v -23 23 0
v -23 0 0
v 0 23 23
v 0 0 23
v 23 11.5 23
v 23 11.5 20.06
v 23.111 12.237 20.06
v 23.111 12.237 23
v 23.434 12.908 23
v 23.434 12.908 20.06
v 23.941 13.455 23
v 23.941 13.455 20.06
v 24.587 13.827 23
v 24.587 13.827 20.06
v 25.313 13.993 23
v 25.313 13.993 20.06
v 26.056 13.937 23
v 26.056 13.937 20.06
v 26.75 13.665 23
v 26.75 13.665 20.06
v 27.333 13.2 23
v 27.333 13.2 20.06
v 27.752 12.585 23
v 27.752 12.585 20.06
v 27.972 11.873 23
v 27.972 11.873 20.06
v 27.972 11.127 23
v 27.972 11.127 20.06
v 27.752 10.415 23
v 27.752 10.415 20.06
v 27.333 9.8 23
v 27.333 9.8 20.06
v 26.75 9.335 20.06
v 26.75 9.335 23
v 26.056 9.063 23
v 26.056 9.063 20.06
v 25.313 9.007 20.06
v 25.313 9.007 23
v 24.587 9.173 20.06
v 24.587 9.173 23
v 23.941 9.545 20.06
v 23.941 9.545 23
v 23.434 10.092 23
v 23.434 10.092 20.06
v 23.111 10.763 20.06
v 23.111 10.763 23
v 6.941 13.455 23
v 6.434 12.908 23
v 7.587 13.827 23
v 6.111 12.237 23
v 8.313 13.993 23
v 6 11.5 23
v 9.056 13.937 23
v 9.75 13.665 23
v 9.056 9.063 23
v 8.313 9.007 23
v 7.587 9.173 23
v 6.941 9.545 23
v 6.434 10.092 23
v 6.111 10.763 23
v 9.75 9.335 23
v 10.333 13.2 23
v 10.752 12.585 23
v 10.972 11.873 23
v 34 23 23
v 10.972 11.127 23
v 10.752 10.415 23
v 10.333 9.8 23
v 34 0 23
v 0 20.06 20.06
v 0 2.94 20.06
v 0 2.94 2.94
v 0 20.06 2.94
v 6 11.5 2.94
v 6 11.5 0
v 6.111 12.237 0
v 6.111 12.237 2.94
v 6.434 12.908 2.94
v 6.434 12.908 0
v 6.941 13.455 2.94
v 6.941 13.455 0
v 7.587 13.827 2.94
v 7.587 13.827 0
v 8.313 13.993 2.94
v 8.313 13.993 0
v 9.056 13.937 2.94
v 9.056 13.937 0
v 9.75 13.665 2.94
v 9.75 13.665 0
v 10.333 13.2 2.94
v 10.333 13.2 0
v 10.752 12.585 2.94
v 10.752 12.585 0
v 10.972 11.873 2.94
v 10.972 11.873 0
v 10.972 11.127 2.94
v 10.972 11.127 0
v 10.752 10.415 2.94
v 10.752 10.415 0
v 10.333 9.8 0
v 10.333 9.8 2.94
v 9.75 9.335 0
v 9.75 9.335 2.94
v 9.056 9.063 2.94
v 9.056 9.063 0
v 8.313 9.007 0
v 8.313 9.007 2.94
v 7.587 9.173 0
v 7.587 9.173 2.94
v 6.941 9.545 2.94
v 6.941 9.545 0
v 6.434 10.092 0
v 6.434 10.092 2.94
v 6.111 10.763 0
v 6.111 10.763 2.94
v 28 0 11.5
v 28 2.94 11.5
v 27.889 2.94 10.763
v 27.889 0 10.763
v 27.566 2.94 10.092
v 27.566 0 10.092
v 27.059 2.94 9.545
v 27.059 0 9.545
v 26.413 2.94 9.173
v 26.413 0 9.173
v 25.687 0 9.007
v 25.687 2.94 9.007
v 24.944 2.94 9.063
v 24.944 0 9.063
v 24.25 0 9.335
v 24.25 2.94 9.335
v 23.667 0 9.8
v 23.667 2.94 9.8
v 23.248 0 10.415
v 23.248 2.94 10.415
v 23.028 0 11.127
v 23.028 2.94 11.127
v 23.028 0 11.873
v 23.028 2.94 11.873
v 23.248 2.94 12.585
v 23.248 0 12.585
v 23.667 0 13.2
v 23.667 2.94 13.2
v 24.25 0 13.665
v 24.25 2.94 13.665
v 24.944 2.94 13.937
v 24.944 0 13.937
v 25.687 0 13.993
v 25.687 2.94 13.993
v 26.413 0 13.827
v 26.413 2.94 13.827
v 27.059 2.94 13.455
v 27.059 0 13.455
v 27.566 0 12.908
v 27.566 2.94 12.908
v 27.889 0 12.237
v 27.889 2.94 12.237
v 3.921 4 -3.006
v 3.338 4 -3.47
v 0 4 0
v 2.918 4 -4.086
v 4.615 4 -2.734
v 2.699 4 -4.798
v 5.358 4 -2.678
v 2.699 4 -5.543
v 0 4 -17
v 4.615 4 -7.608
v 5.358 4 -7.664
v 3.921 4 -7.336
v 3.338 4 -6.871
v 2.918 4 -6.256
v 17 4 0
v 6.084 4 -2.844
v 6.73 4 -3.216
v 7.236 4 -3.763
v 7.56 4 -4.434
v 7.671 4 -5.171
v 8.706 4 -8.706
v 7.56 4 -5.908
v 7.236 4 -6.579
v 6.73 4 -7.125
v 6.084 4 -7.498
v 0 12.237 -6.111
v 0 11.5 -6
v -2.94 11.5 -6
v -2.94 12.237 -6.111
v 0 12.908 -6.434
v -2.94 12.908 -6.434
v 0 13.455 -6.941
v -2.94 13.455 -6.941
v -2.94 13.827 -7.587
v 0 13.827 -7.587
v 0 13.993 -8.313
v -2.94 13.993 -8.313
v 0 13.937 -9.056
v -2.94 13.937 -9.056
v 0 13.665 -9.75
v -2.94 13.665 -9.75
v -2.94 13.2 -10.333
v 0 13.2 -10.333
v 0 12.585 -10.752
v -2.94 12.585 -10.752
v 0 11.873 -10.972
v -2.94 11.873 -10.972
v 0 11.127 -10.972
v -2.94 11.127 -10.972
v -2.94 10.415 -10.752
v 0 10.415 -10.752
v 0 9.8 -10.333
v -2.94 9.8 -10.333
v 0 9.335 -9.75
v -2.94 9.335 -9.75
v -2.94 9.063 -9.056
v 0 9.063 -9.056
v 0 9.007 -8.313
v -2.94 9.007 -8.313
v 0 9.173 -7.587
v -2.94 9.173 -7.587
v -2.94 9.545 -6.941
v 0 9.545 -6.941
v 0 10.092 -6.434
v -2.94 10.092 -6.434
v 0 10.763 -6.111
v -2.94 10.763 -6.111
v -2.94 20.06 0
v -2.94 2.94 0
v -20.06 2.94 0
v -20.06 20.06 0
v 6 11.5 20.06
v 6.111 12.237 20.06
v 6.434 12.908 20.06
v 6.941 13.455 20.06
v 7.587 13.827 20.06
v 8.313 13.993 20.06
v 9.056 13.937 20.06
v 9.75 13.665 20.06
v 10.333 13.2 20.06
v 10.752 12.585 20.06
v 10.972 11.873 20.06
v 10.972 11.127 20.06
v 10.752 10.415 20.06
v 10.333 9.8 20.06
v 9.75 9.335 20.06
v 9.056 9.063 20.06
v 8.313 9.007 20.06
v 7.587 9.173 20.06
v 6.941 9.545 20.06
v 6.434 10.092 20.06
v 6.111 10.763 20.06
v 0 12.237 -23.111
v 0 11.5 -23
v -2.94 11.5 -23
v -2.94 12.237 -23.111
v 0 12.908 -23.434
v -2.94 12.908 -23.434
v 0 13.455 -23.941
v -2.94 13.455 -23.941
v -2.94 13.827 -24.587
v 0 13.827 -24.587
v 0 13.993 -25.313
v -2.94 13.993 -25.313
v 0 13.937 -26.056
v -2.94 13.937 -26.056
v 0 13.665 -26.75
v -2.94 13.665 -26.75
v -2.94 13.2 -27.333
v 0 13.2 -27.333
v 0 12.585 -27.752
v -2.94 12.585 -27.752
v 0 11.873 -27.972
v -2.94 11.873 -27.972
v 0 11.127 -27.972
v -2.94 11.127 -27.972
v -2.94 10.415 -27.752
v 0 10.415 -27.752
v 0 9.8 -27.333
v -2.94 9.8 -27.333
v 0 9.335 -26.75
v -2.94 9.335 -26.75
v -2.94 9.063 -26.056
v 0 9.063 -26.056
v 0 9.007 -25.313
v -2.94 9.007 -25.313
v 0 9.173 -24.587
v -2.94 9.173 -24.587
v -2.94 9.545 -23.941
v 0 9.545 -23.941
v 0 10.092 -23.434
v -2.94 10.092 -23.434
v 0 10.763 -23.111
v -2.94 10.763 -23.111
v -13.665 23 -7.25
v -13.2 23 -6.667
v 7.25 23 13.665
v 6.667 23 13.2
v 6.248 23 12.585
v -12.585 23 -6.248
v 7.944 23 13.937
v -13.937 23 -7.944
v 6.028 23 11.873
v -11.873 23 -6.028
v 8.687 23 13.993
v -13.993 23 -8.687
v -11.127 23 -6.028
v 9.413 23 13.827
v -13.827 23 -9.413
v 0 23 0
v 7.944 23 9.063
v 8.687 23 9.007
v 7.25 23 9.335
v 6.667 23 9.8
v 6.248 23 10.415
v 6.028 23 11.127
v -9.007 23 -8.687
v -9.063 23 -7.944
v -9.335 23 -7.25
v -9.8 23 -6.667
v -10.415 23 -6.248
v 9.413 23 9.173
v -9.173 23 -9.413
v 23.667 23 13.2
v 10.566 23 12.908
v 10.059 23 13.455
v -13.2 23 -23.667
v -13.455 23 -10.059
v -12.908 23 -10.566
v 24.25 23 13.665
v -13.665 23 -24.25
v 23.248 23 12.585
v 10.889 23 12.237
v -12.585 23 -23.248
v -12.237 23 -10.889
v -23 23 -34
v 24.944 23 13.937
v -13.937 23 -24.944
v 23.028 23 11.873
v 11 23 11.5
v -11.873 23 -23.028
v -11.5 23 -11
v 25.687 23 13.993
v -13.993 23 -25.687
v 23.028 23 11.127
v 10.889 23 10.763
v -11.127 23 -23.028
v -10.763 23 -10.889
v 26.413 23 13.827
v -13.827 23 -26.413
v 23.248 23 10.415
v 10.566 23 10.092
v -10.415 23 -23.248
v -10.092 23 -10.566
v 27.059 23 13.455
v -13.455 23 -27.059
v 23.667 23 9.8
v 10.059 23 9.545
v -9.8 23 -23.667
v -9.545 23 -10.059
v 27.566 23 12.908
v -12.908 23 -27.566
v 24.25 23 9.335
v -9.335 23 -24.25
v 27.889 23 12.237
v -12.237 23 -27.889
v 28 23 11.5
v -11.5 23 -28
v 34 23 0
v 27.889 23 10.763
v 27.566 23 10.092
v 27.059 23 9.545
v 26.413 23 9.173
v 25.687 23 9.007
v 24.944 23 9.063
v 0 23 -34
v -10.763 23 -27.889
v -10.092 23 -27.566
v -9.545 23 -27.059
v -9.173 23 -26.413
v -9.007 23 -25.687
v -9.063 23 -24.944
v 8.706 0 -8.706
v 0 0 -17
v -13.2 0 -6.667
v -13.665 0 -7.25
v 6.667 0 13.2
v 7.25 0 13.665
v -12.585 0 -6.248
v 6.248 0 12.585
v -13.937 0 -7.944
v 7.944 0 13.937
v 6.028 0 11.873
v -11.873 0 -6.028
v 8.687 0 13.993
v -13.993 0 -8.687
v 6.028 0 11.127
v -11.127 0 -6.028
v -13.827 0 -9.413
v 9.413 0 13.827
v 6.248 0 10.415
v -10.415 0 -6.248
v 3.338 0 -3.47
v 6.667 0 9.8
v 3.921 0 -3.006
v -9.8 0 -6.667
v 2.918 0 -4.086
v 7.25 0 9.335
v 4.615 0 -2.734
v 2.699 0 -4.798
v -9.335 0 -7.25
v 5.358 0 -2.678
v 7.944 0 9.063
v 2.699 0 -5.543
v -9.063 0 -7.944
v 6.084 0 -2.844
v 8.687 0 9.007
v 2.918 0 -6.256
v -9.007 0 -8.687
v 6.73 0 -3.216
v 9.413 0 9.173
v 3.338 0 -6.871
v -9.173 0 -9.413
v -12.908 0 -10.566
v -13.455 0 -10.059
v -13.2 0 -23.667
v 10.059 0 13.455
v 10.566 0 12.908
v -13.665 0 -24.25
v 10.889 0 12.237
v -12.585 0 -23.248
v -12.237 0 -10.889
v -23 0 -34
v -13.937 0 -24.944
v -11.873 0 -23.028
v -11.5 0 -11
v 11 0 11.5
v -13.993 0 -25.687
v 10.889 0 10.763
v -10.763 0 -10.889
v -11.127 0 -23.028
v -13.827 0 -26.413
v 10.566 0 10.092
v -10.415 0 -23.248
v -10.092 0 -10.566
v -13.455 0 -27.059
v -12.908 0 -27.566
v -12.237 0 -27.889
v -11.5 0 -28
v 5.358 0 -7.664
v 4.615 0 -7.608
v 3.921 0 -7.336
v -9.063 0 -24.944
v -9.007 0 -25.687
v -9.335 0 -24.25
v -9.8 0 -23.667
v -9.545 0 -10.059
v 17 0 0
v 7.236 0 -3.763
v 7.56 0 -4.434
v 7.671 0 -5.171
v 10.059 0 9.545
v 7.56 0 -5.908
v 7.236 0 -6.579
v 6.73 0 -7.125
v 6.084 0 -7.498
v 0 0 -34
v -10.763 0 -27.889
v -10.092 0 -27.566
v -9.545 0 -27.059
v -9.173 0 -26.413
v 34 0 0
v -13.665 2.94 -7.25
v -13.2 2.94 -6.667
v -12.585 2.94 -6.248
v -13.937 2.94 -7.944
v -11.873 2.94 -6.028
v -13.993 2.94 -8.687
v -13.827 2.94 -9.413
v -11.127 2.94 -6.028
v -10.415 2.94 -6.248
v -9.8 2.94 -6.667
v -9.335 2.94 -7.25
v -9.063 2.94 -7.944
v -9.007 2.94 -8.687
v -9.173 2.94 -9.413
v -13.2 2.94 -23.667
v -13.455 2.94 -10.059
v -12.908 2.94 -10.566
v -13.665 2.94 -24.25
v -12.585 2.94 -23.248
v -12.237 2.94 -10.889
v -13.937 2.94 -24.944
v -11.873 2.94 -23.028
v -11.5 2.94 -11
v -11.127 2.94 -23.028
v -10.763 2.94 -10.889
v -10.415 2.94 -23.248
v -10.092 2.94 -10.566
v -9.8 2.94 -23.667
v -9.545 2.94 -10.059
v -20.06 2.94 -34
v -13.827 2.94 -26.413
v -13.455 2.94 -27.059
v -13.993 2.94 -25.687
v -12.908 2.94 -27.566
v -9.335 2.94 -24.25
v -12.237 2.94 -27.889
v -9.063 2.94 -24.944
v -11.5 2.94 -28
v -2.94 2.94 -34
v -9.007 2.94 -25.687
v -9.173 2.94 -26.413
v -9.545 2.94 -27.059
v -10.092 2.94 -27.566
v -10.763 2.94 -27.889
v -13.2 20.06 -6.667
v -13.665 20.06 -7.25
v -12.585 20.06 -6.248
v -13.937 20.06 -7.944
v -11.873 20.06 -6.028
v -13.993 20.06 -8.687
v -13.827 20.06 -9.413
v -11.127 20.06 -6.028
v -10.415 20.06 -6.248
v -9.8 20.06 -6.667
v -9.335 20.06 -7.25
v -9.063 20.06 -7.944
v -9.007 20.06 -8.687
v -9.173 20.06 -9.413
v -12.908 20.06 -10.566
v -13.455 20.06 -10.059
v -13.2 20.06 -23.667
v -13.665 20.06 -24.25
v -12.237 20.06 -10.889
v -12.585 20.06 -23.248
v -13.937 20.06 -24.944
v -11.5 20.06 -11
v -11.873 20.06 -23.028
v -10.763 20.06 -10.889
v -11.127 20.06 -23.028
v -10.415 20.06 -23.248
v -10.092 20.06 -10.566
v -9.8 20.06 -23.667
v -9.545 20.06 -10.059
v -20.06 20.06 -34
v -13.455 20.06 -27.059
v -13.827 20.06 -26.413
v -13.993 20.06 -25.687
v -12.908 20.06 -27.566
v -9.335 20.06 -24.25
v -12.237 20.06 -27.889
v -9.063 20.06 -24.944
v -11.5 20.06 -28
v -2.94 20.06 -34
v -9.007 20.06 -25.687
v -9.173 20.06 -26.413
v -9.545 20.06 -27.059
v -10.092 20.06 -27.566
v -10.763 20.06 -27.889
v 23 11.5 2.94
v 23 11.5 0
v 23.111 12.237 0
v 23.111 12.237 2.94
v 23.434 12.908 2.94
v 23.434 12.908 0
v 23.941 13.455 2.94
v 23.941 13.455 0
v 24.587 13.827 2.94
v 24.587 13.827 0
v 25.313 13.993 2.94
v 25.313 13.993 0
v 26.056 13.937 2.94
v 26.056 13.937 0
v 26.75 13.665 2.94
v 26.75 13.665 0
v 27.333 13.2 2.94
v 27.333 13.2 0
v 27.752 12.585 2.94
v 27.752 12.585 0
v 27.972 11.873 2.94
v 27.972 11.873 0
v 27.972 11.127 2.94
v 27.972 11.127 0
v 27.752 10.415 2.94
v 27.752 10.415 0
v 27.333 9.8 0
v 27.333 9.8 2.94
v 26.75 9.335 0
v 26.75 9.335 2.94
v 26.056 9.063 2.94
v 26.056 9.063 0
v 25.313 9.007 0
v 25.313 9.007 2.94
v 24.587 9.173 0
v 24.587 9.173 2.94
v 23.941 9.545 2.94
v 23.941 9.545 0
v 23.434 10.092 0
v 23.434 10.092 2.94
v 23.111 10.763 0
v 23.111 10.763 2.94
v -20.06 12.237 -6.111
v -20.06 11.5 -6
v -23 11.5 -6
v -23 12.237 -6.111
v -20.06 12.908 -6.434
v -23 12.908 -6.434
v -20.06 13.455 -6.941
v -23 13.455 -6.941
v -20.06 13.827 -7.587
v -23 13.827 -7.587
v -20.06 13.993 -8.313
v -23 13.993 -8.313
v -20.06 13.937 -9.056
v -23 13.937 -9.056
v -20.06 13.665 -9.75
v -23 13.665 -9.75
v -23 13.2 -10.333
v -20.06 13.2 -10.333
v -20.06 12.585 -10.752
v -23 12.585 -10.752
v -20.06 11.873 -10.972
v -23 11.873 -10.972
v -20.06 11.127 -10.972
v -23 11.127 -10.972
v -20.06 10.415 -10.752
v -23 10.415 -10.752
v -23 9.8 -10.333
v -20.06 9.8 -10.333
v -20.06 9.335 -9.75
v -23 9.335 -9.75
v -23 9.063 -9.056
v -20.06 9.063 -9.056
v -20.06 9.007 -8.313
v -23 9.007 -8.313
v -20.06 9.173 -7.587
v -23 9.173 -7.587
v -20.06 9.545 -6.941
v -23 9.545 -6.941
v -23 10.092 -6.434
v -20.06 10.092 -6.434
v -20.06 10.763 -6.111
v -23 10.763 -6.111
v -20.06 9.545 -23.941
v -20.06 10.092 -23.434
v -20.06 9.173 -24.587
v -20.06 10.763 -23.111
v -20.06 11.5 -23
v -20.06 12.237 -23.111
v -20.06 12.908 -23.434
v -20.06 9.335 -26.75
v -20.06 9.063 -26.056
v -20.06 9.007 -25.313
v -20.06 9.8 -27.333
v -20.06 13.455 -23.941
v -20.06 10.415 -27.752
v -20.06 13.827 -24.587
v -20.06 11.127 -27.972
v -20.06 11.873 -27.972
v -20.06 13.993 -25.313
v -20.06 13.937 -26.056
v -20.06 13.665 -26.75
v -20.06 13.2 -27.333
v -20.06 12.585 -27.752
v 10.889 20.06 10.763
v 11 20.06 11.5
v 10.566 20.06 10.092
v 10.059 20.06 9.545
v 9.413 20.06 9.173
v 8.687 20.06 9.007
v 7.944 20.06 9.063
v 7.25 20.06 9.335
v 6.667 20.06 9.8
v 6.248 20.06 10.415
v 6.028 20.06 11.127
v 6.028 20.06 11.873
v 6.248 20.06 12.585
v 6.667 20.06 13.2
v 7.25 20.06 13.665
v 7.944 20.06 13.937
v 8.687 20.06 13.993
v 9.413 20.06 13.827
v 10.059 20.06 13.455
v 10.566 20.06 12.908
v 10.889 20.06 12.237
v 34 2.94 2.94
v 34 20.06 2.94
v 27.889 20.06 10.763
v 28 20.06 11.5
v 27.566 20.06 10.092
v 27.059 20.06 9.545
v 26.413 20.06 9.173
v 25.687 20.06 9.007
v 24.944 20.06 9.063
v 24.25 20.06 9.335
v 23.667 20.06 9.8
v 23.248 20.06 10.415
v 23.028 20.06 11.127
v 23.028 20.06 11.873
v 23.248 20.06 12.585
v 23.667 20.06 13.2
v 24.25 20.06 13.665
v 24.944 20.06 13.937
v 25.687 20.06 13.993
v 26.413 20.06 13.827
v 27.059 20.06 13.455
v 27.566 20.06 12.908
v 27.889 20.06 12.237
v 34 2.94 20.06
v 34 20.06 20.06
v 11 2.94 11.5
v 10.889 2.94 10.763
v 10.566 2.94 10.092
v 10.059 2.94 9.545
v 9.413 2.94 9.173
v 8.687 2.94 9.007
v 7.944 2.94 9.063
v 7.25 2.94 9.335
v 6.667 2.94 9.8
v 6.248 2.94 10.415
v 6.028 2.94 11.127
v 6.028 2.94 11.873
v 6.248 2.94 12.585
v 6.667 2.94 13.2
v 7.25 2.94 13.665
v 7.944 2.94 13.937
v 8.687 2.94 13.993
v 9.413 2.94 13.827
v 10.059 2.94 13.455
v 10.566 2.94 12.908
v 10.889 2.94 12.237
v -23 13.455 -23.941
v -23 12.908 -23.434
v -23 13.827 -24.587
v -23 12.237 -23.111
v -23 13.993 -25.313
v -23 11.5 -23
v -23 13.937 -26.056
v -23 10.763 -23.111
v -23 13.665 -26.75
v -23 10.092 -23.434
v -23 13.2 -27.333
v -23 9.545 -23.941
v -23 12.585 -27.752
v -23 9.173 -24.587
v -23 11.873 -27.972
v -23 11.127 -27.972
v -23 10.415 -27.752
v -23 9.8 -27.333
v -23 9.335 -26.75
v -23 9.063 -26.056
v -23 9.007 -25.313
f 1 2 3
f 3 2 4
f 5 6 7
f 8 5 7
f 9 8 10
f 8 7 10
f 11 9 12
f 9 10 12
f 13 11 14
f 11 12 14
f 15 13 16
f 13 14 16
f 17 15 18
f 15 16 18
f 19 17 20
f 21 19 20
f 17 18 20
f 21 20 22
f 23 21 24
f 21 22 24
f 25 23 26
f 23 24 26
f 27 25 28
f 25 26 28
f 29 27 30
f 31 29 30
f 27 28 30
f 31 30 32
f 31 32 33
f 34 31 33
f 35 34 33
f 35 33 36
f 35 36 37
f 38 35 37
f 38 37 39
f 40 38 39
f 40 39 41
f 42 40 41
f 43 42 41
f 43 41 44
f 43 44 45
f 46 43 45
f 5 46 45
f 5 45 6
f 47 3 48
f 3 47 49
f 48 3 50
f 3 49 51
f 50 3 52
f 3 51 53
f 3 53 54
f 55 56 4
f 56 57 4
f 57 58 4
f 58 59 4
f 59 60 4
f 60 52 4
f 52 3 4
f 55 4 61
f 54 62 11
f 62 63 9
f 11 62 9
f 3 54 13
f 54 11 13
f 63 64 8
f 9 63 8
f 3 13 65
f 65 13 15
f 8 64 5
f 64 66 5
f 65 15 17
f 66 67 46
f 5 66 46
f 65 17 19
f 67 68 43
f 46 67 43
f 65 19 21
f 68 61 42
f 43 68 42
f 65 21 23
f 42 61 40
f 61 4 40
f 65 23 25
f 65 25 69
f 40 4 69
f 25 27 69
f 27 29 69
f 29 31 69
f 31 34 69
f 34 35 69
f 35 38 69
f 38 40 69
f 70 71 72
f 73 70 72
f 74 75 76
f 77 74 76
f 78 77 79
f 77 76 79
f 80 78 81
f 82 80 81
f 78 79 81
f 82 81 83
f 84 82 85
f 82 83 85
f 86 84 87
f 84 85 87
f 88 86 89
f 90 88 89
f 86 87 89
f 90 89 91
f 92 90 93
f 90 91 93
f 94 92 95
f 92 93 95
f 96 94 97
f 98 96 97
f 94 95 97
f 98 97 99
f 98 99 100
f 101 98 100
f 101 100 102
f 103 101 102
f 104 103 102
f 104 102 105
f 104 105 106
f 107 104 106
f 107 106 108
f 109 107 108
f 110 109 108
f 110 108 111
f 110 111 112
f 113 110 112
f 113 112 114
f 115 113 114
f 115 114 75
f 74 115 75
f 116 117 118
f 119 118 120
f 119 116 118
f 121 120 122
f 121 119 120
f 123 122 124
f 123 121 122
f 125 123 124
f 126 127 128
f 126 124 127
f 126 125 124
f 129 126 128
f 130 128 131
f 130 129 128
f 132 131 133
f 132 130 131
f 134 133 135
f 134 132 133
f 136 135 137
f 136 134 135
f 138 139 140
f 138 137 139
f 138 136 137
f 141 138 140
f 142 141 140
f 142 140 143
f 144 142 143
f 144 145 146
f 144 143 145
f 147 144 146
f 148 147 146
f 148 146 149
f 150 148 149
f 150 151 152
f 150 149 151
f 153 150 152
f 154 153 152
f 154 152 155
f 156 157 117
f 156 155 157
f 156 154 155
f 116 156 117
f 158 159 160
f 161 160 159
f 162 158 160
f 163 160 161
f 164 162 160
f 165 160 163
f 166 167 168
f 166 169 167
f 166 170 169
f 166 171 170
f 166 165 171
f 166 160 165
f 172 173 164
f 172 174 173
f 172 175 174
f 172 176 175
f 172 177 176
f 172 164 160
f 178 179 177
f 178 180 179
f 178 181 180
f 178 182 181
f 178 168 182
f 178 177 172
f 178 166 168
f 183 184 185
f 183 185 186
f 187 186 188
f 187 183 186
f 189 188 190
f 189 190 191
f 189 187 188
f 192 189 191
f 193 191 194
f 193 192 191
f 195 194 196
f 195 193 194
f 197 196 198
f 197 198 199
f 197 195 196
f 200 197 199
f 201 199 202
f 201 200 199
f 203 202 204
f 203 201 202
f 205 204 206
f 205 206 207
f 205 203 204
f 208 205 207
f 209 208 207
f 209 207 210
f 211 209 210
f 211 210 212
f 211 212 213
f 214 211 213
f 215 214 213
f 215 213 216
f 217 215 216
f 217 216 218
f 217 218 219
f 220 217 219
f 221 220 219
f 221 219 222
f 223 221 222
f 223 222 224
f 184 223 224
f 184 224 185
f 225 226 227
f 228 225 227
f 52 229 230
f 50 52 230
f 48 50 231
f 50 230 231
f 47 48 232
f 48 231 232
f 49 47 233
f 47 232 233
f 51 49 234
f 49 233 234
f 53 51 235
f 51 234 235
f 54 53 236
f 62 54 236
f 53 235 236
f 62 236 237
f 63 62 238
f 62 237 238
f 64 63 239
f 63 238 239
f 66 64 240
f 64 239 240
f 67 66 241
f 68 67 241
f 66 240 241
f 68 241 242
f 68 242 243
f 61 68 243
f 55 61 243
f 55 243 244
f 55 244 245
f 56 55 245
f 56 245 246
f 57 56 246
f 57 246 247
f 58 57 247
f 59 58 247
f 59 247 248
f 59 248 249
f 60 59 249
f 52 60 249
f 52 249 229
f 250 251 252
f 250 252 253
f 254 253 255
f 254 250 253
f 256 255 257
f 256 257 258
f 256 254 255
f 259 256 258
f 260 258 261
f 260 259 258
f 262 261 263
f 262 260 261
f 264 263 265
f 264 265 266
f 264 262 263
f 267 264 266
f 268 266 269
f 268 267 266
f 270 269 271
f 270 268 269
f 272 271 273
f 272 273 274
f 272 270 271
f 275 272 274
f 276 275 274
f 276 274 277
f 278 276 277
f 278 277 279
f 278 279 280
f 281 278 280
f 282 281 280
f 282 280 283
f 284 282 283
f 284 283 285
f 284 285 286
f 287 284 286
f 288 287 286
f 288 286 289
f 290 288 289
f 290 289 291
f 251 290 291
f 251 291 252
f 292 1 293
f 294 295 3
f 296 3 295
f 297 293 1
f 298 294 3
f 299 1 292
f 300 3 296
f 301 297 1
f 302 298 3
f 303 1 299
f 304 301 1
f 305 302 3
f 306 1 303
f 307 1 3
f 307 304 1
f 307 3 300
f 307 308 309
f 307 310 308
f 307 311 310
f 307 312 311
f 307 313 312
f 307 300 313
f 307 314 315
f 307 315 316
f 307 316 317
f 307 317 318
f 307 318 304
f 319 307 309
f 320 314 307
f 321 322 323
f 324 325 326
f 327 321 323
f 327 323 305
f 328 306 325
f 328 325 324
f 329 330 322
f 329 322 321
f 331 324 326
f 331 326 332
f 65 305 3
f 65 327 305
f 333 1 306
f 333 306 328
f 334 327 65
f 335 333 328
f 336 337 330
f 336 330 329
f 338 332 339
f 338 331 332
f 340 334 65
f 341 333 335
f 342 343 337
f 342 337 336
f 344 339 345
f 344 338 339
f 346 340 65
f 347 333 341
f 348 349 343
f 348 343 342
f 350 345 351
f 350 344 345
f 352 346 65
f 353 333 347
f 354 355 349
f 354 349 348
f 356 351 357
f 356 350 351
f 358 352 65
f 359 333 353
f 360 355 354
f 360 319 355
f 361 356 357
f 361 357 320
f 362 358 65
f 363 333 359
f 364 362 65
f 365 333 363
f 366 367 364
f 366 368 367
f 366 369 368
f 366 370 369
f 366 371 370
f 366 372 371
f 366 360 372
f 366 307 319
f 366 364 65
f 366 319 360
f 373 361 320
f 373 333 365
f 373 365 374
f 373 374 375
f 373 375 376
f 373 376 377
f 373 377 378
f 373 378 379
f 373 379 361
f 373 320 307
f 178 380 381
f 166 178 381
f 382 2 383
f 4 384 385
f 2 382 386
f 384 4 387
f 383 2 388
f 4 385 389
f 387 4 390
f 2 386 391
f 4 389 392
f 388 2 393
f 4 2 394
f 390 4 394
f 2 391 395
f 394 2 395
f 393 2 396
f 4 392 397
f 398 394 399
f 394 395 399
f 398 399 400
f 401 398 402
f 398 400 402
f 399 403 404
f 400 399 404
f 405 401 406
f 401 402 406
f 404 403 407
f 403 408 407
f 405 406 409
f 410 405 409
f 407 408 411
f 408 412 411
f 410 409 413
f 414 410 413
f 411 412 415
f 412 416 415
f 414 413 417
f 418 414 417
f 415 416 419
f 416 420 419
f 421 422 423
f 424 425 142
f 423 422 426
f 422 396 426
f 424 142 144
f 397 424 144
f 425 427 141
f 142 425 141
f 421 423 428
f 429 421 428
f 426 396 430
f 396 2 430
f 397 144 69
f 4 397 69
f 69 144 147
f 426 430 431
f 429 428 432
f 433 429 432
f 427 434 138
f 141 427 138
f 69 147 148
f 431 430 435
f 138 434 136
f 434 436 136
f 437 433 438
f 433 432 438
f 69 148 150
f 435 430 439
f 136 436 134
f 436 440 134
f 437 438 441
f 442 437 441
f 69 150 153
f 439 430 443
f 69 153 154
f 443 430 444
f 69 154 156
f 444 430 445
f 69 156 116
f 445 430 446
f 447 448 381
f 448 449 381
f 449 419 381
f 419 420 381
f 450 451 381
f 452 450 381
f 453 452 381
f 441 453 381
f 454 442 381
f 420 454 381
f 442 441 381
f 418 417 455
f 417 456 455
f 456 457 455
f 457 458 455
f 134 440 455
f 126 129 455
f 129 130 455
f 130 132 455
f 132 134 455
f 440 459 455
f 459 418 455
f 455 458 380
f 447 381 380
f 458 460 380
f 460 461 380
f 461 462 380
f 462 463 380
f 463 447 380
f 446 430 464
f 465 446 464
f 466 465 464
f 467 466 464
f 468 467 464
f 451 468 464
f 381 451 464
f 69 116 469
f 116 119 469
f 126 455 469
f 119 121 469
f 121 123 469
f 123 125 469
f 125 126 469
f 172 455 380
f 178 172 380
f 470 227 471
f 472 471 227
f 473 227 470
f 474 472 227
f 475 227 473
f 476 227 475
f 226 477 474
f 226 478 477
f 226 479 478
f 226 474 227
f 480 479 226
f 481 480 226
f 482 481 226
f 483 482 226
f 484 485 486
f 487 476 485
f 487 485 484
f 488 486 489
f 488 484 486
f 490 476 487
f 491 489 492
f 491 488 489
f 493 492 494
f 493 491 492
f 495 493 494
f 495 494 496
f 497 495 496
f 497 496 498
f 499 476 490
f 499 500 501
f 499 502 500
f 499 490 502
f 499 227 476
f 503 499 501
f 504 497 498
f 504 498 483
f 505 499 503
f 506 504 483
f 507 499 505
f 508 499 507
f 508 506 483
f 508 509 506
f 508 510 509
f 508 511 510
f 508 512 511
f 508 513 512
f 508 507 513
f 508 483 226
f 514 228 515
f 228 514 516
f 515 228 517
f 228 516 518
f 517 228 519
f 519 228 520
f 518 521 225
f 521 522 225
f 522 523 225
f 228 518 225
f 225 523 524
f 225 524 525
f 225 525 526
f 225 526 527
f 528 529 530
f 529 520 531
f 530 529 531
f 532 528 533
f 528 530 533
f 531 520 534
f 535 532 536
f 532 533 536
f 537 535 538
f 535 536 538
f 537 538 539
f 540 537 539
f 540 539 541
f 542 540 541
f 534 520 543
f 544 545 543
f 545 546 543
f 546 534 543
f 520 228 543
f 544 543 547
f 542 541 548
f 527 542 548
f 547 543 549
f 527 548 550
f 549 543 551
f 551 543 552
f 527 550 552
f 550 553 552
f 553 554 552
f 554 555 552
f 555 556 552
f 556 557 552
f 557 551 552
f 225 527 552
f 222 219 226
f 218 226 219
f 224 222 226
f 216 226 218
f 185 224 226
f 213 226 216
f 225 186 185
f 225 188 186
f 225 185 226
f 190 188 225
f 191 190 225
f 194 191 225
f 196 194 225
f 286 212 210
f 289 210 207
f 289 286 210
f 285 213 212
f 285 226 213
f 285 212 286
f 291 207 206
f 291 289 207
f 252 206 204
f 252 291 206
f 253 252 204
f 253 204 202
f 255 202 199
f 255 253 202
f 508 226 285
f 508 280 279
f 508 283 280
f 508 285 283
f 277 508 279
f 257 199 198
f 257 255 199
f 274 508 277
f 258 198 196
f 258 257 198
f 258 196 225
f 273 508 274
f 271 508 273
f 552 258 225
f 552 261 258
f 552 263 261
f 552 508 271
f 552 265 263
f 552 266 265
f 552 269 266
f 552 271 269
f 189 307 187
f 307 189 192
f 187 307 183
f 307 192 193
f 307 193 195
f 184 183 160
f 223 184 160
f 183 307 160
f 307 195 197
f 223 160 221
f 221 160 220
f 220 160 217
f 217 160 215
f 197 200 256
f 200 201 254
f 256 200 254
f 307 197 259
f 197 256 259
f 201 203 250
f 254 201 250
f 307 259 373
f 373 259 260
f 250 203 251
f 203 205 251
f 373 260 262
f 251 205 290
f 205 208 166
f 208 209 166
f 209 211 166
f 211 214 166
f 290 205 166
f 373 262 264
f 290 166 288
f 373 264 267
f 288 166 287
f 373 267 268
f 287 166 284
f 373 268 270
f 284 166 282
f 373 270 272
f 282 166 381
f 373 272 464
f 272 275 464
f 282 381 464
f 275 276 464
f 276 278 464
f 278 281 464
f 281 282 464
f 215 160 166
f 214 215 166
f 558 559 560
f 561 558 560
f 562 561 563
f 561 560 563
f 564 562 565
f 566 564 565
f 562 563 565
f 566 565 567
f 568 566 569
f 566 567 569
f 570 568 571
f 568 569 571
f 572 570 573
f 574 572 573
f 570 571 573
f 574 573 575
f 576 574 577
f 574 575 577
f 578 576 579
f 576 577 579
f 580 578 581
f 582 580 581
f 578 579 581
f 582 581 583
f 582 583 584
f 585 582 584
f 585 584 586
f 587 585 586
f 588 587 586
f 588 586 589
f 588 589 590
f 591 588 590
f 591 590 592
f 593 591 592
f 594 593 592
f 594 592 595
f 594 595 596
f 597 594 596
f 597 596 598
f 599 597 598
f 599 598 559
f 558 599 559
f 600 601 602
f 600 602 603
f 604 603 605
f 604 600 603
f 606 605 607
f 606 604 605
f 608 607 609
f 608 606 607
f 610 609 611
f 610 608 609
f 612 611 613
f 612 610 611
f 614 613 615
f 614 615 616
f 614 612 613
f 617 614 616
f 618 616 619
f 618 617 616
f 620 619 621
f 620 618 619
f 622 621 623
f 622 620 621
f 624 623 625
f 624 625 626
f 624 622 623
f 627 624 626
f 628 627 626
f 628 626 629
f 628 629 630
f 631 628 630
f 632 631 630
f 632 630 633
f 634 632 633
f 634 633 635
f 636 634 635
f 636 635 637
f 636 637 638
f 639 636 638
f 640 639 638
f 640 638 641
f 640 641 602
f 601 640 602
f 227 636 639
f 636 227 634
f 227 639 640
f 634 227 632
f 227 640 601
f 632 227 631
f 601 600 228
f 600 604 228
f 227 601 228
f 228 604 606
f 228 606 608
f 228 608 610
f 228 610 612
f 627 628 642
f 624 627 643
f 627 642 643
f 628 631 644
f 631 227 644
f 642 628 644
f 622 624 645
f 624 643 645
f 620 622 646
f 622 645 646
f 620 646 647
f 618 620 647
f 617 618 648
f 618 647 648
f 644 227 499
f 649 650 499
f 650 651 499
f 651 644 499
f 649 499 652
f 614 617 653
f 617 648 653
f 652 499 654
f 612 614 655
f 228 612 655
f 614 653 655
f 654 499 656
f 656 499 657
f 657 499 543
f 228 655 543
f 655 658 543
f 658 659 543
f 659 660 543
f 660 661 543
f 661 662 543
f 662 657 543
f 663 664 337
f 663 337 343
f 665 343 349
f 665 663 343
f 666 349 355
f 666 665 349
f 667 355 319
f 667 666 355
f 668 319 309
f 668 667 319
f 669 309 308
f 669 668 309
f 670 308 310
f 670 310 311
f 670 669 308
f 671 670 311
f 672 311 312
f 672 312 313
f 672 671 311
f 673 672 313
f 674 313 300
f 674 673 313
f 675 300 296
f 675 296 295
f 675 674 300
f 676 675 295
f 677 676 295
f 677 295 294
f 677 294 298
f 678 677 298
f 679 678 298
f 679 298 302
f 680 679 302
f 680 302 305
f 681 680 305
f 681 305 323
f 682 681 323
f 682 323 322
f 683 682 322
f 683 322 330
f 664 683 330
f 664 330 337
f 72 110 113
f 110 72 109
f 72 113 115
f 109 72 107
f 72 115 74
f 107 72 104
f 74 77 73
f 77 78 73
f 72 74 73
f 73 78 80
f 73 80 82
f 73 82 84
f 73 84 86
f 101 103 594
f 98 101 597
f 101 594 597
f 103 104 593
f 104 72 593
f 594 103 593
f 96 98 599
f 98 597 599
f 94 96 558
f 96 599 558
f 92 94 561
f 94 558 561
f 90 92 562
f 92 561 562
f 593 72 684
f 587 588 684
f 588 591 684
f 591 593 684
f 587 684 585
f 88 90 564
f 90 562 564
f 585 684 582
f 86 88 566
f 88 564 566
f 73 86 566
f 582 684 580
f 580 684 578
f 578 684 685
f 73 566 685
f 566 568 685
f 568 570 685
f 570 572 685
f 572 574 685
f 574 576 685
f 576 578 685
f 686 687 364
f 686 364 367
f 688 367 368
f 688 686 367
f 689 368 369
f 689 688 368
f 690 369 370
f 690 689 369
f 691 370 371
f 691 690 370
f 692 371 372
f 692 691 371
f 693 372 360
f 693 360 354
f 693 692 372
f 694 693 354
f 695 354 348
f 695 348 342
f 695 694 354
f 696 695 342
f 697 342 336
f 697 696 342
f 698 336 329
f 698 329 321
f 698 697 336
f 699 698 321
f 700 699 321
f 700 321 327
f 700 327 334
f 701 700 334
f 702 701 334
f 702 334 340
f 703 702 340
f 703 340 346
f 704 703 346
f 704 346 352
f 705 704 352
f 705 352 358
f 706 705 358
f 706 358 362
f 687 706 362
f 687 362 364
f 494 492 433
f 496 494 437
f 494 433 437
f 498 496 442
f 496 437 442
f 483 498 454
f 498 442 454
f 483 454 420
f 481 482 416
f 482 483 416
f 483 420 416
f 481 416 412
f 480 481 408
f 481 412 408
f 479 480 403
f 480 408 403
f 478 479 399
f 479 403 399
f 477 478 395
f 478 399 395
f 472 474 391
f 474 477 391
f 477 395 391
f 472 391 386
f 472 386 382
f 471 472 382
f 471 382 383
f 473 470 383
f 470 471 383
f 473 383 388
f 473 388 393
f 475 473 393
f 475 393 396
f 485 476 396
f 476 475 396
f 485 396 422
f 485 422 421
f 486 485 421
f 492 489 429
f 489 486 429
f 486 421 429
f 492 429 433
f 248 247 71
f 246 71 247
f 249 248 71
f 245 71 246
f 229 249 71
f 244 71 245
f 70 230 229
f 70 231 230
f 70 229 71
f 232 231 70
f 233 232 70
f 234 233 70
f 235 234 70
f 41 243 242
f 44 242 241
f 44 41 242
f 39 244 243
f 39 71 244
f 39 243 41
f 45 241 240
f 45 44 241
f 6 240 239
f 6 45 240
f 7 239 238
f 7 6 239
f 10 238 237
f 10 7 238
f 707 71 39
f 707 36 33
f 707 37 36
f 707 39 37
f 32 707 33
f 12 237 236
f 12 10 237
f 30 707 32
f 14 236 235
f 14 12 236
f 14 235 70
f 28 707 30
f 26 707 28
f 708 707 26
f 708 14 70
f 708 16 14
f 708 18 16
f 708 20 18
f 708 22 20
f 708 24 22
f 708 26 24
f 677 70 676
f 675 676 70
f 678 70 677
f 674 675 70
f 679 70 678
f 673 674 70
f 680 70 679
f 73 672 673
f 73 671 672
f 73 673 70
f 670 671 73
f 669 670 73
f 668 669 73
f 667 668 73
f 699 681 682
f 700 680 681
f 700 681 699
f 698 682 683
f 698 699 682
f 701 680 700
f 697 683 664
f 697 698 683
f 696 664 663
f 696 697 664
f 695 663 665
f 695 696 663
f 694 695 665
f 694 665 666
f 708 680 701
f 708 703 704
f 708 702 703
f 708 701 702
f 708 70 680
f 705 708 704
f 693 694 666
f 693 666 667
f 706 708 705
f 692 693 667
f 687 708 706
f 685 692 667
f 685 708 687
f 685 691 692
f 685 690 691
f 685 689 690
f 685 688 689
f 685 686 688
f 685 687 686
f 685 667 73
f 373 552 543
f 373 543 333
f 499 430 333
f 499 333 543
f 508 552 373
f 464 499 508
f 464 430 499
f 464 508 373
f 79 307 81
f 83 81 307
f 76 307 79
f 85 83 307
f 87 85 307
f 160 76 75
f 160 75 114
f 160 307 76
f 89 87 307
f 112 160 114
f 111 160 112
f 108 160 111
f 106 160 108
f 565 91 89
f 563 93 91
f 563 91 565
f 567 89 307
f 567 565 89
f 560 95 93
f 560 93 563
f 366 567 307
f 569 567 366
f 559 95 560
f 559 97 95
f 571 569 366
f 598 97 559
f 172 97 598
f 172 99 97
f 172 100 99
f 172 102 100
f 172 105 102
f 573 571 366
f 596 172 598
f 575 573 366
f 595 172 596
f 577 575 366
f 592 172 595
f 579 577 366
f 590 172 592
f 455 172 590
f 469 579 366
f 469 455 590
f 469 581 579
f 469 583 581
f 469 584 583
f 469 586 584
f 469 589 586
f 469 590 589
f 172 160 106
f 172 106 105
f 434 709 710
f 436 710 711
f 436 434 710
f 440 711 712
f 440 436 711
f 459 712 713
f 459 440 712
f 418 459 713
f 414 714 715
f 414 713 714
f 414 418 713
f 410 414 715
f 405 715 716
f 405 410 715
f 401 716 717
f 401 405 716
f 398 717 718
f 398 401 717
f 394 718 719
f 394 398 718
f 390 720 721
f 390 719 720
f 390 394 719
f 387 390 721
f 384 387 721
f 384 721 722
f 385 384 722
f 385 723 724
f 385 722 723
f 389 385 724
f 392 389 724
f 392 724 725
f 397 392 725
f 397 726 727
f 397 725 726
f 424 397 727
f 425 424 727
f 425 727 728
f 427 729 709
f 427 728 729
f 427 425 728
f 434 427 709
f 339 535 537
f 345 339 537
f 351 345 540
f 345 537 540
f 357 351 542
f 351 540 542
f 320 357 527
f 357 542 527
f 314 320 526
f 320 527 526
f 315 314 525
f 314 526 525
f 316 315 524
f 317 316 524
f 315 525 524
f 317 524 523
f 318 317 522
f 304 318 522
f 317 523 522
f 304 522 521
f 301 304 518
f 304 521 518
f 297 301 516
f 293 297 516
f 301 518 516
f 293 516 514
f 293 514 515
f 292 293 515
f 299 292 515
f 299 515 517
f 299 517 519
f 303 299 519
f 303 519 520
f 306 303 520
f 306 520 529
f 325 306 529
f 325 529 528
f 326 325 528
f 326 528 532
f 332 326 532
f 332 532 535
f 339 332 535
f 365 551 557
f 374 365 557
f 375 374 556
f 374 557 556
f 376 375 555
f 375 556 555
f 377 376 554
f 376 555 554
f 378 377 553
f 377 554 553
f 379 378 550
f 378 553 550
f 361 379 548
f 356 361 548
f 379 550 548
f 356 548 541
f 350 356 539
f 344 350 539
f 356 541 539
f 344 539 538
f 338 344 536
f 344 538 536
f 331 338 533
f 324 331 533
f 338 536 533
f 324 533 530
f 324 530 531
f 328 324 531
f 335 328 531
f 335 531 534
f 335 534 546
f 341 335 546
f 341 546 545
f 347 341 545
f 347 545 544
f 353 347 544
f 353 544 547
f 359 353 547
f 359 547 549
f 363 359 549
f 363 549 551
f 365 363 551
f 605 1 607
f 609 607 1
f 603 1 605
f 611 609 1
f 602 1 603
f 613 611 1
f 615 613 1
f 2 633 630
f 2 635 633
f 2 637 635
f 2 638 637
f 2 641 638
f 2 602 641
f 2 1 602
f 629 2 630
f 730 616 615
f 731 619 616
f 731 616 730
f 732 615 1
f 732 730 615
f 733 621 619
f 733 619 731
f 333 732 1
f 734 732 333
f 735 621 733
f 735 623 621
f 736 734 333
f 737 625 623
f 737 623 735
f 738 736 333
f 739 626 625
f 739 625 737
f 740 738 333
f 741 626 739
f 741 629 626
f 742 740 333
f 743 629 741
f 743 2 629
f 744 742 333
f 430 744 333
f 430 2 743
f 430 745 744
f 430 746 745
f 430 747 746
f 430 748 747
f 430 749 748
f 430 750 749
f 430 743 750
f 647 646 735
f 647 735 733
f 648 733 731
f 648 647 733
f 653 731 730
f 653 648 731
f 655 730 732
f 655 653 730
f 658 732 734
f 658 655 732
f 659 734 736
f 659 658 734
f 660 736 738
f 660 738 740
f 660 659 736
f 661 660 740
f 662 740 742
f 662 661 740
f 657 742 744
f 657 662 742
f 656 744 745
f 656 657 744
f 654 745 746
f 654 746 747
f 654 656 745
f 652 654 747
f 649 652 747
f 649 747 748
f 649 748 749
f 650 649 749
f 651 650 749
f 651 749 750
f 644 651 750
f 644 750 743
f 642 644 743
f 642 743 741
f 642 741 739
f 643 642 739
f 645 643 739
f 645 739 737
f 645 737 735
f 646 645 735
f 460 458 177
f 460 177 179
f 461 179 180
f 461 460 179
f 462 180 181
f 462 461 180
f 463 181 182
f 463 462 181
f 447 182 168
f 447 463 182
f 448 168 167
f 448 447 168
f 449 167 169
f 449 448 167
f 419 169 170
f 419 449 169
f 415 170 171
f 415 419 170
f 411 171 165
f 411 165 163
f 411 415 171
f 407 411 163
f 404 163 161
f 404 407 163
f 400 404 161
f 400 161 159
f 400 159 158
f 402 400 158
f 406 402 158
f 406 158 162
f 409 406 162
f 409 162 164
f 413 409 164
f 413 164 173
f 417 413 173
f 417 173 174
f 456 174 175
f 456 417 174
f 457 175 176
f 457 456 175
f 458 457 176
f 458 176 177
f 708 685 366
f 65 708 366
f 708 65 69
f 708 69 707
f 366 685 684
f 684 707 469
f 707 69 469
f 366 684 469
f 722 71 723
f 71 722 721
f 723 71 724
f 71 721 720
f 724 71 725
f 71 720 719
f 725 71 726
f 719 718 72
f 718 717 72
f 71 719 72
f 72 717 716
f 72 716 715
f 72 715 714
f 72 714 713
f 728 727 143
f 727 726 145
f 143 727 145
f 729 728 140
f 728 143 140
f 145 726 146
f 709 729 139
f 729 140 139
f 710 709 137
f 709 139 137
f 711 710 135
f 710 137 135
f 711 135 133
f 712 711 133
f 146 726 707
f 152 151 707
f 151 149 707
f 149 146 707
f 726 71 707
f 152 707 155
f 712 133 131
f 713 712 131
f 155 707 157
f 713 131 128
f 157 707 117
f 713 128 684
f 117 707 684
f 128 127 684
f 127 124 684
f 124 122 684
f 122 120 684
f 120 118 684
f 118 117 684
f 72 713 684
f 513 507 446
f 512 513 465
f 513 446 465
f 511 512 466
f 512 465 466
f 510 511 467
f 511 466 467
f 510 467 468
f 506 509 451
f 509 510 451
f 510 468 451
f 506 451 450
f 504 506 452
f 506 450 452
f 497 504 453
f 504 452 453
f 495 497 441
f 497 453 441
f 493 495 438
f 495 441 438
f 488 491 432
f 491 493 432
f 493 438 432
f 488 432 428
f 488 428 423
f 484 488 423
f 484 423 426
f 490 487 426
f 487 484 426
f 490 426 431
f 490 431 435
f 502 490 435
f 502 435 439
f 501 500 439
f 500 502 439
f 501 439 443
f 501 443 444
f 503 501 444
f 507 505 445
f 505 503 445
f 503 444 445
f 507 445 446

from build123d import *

# Parameters (mm, degrees)
SKETCH1_W           = 34
SKETCH1_H           = 23
SKETCH1_R           = 2.5
BOSS_EXTRUDE1_DEPTH = 23
SKETCH6_OUTSIDE_W   = 45.41
SKETCH6_OUTSIDE_H   = 34.41
SKETCH6_OUTSIDE_W_2 = 34
SKETCH6_OUTSIDE_H_2 = 23
SKETCH6_OUTSIDE_R   = 2.5
CUT_EXTRUDE10_DEPTH = 24
SKETCH7_OUTSIDE_W   = 34.41
SKETCH7_OUTSIDE_H   = 34.41
SKETCH7_OUTSIDE_W_2 = 23
SKETCH7_OUTSIDE_H_2 = 23
SKETCH7_OUTSIDE_W_3 = 17.12
SKETCH7_OUTSIDE_H_3 = 17.12
CUT_EXTRUDE11_DEPTH = 34
BOSS_EXTRUDE2_DEPTH = 23
SKETCH13_R          = 2.5
BOSS_EXTRUDE3_DEPTH = 4


with BuildPart() as part:
    # sketch1 → Boss-Extrude1 (new body)
    with BuildSketch(Plane(origin=(0, 0, 0), x_dir=(1, 0, 0), z_dir=(0, 1, 0))):
        with Locations((17, -11.5)):
            Rectangle(SKETCH1_W, SKETCH1_H)
        with Locations((8.5, -11.5)):
            Circle(SKETCH1_R, mode=Mode.SUBTRACT)
        with Locations((25.5, -11.5)):
            Circle(SKETCH1_R, mode=Mode.SUBTRACT)
    extrude(amount=BOSS_EXTRUDE1_DEPTH)

    # Sketch6 outside → Cut-Extrude10 (cut, through all)
    with BuildSketch(Plane(origin=(0, 0, 0), x_dir=(-1, 0, 0), z_dir=(0, 0, -1))):
        with Locations((-17, 11.5)):
            Rectangle(SKETCH6_OUTSIDE_W, SKETCH6_OUTSIDE_H)
        with Locations((-17, 11.5)):
            Rectangle(SKETCH6_OUTSIDE_W_2, SKETCH6_OUTSIDE_H_2, mode=Mode.SUBTRACT)
        with Locations((-25.5, 11.5)):
            Circle(SKETCH6_OUTSIDE_R)
        with Locations((-8.5, 11.5)):
            Circle(SKETCH6_OUTSIDE_R)
    extrude(amount=-CUT_EXTRUDE10_DEPTH, mode=Mode.SUBTRACT)

    # Sketch7 outside → Cut-Extrude11 (cut)
    with BuildSketch(Plane(origin=(34, 0, 0), x_dir=(0, 0, -1), z_dir=(1, 0, 0))):
        with Locations((-11.5, 11.5)):
            Rectangle(SKETCH7_OUTSIDE_W, SKETCH7_OUTSIDE_H)
        with Locations((-11.5, 11.5)):
            Rectangle(SKETCH7_OUTSIDE_W_2, SKETCH7_OUTSIDE_H_2, mode=Mode.SUBTRACT)
        with Locations((-11.5, 11.5)):
            Rectangle(SKETCH7_OUTSIDE_W_3, SKETCH7_OUTSIDE_H_3)
    extrude(amount=-CUT_EXTRUDE11_DEPTH, mode=Mode.SUBTRACT)


with BuildPart() as body_2:
    # Mirror6: mirrored copy
    add(part.part.mirror(Plane(origin=(0, 0, 0), x_dir=(-0.707106781, 0, 0.707106781), z_dir=(-0.707106781, 0, -0.707106781))))


with BuildPart() as part_1:
    add(part.part)

    add(body_2.part)  # Boss-Extrude2 merges body 2
    # Sketch11 → Boss-Extrude2 (add)
    with BuildSketch(Plane(origin=(0, 0, 0), x_dir=(1, 0, 0), z_dir=(0, 1, 0))):
        Polygon((-23, 0), (0, -23), (0, 0), align=None)
    extrude(amount=BOSS_EXTRUDE2_DEPTH)

    # Sketch13 → Boss-Extrude3 (add)
    with BuildSketch(Plane(origin=(0, 0, 0), x_dir=(1, 0, 0), z_dir=(0, 1, 0))):
        Polygon((8.706365938, 8.706365938), (0, 17), (0, 0), (17, 0), align=None)
        with Locations((5.170832032, 5.170832032)):
            Circle(SKETCH13_R, mode=Mode.SUBTRACT)
    extrude(amount=BOSS_EXTRUDE3_DEPTH)


solid = part_1.part
